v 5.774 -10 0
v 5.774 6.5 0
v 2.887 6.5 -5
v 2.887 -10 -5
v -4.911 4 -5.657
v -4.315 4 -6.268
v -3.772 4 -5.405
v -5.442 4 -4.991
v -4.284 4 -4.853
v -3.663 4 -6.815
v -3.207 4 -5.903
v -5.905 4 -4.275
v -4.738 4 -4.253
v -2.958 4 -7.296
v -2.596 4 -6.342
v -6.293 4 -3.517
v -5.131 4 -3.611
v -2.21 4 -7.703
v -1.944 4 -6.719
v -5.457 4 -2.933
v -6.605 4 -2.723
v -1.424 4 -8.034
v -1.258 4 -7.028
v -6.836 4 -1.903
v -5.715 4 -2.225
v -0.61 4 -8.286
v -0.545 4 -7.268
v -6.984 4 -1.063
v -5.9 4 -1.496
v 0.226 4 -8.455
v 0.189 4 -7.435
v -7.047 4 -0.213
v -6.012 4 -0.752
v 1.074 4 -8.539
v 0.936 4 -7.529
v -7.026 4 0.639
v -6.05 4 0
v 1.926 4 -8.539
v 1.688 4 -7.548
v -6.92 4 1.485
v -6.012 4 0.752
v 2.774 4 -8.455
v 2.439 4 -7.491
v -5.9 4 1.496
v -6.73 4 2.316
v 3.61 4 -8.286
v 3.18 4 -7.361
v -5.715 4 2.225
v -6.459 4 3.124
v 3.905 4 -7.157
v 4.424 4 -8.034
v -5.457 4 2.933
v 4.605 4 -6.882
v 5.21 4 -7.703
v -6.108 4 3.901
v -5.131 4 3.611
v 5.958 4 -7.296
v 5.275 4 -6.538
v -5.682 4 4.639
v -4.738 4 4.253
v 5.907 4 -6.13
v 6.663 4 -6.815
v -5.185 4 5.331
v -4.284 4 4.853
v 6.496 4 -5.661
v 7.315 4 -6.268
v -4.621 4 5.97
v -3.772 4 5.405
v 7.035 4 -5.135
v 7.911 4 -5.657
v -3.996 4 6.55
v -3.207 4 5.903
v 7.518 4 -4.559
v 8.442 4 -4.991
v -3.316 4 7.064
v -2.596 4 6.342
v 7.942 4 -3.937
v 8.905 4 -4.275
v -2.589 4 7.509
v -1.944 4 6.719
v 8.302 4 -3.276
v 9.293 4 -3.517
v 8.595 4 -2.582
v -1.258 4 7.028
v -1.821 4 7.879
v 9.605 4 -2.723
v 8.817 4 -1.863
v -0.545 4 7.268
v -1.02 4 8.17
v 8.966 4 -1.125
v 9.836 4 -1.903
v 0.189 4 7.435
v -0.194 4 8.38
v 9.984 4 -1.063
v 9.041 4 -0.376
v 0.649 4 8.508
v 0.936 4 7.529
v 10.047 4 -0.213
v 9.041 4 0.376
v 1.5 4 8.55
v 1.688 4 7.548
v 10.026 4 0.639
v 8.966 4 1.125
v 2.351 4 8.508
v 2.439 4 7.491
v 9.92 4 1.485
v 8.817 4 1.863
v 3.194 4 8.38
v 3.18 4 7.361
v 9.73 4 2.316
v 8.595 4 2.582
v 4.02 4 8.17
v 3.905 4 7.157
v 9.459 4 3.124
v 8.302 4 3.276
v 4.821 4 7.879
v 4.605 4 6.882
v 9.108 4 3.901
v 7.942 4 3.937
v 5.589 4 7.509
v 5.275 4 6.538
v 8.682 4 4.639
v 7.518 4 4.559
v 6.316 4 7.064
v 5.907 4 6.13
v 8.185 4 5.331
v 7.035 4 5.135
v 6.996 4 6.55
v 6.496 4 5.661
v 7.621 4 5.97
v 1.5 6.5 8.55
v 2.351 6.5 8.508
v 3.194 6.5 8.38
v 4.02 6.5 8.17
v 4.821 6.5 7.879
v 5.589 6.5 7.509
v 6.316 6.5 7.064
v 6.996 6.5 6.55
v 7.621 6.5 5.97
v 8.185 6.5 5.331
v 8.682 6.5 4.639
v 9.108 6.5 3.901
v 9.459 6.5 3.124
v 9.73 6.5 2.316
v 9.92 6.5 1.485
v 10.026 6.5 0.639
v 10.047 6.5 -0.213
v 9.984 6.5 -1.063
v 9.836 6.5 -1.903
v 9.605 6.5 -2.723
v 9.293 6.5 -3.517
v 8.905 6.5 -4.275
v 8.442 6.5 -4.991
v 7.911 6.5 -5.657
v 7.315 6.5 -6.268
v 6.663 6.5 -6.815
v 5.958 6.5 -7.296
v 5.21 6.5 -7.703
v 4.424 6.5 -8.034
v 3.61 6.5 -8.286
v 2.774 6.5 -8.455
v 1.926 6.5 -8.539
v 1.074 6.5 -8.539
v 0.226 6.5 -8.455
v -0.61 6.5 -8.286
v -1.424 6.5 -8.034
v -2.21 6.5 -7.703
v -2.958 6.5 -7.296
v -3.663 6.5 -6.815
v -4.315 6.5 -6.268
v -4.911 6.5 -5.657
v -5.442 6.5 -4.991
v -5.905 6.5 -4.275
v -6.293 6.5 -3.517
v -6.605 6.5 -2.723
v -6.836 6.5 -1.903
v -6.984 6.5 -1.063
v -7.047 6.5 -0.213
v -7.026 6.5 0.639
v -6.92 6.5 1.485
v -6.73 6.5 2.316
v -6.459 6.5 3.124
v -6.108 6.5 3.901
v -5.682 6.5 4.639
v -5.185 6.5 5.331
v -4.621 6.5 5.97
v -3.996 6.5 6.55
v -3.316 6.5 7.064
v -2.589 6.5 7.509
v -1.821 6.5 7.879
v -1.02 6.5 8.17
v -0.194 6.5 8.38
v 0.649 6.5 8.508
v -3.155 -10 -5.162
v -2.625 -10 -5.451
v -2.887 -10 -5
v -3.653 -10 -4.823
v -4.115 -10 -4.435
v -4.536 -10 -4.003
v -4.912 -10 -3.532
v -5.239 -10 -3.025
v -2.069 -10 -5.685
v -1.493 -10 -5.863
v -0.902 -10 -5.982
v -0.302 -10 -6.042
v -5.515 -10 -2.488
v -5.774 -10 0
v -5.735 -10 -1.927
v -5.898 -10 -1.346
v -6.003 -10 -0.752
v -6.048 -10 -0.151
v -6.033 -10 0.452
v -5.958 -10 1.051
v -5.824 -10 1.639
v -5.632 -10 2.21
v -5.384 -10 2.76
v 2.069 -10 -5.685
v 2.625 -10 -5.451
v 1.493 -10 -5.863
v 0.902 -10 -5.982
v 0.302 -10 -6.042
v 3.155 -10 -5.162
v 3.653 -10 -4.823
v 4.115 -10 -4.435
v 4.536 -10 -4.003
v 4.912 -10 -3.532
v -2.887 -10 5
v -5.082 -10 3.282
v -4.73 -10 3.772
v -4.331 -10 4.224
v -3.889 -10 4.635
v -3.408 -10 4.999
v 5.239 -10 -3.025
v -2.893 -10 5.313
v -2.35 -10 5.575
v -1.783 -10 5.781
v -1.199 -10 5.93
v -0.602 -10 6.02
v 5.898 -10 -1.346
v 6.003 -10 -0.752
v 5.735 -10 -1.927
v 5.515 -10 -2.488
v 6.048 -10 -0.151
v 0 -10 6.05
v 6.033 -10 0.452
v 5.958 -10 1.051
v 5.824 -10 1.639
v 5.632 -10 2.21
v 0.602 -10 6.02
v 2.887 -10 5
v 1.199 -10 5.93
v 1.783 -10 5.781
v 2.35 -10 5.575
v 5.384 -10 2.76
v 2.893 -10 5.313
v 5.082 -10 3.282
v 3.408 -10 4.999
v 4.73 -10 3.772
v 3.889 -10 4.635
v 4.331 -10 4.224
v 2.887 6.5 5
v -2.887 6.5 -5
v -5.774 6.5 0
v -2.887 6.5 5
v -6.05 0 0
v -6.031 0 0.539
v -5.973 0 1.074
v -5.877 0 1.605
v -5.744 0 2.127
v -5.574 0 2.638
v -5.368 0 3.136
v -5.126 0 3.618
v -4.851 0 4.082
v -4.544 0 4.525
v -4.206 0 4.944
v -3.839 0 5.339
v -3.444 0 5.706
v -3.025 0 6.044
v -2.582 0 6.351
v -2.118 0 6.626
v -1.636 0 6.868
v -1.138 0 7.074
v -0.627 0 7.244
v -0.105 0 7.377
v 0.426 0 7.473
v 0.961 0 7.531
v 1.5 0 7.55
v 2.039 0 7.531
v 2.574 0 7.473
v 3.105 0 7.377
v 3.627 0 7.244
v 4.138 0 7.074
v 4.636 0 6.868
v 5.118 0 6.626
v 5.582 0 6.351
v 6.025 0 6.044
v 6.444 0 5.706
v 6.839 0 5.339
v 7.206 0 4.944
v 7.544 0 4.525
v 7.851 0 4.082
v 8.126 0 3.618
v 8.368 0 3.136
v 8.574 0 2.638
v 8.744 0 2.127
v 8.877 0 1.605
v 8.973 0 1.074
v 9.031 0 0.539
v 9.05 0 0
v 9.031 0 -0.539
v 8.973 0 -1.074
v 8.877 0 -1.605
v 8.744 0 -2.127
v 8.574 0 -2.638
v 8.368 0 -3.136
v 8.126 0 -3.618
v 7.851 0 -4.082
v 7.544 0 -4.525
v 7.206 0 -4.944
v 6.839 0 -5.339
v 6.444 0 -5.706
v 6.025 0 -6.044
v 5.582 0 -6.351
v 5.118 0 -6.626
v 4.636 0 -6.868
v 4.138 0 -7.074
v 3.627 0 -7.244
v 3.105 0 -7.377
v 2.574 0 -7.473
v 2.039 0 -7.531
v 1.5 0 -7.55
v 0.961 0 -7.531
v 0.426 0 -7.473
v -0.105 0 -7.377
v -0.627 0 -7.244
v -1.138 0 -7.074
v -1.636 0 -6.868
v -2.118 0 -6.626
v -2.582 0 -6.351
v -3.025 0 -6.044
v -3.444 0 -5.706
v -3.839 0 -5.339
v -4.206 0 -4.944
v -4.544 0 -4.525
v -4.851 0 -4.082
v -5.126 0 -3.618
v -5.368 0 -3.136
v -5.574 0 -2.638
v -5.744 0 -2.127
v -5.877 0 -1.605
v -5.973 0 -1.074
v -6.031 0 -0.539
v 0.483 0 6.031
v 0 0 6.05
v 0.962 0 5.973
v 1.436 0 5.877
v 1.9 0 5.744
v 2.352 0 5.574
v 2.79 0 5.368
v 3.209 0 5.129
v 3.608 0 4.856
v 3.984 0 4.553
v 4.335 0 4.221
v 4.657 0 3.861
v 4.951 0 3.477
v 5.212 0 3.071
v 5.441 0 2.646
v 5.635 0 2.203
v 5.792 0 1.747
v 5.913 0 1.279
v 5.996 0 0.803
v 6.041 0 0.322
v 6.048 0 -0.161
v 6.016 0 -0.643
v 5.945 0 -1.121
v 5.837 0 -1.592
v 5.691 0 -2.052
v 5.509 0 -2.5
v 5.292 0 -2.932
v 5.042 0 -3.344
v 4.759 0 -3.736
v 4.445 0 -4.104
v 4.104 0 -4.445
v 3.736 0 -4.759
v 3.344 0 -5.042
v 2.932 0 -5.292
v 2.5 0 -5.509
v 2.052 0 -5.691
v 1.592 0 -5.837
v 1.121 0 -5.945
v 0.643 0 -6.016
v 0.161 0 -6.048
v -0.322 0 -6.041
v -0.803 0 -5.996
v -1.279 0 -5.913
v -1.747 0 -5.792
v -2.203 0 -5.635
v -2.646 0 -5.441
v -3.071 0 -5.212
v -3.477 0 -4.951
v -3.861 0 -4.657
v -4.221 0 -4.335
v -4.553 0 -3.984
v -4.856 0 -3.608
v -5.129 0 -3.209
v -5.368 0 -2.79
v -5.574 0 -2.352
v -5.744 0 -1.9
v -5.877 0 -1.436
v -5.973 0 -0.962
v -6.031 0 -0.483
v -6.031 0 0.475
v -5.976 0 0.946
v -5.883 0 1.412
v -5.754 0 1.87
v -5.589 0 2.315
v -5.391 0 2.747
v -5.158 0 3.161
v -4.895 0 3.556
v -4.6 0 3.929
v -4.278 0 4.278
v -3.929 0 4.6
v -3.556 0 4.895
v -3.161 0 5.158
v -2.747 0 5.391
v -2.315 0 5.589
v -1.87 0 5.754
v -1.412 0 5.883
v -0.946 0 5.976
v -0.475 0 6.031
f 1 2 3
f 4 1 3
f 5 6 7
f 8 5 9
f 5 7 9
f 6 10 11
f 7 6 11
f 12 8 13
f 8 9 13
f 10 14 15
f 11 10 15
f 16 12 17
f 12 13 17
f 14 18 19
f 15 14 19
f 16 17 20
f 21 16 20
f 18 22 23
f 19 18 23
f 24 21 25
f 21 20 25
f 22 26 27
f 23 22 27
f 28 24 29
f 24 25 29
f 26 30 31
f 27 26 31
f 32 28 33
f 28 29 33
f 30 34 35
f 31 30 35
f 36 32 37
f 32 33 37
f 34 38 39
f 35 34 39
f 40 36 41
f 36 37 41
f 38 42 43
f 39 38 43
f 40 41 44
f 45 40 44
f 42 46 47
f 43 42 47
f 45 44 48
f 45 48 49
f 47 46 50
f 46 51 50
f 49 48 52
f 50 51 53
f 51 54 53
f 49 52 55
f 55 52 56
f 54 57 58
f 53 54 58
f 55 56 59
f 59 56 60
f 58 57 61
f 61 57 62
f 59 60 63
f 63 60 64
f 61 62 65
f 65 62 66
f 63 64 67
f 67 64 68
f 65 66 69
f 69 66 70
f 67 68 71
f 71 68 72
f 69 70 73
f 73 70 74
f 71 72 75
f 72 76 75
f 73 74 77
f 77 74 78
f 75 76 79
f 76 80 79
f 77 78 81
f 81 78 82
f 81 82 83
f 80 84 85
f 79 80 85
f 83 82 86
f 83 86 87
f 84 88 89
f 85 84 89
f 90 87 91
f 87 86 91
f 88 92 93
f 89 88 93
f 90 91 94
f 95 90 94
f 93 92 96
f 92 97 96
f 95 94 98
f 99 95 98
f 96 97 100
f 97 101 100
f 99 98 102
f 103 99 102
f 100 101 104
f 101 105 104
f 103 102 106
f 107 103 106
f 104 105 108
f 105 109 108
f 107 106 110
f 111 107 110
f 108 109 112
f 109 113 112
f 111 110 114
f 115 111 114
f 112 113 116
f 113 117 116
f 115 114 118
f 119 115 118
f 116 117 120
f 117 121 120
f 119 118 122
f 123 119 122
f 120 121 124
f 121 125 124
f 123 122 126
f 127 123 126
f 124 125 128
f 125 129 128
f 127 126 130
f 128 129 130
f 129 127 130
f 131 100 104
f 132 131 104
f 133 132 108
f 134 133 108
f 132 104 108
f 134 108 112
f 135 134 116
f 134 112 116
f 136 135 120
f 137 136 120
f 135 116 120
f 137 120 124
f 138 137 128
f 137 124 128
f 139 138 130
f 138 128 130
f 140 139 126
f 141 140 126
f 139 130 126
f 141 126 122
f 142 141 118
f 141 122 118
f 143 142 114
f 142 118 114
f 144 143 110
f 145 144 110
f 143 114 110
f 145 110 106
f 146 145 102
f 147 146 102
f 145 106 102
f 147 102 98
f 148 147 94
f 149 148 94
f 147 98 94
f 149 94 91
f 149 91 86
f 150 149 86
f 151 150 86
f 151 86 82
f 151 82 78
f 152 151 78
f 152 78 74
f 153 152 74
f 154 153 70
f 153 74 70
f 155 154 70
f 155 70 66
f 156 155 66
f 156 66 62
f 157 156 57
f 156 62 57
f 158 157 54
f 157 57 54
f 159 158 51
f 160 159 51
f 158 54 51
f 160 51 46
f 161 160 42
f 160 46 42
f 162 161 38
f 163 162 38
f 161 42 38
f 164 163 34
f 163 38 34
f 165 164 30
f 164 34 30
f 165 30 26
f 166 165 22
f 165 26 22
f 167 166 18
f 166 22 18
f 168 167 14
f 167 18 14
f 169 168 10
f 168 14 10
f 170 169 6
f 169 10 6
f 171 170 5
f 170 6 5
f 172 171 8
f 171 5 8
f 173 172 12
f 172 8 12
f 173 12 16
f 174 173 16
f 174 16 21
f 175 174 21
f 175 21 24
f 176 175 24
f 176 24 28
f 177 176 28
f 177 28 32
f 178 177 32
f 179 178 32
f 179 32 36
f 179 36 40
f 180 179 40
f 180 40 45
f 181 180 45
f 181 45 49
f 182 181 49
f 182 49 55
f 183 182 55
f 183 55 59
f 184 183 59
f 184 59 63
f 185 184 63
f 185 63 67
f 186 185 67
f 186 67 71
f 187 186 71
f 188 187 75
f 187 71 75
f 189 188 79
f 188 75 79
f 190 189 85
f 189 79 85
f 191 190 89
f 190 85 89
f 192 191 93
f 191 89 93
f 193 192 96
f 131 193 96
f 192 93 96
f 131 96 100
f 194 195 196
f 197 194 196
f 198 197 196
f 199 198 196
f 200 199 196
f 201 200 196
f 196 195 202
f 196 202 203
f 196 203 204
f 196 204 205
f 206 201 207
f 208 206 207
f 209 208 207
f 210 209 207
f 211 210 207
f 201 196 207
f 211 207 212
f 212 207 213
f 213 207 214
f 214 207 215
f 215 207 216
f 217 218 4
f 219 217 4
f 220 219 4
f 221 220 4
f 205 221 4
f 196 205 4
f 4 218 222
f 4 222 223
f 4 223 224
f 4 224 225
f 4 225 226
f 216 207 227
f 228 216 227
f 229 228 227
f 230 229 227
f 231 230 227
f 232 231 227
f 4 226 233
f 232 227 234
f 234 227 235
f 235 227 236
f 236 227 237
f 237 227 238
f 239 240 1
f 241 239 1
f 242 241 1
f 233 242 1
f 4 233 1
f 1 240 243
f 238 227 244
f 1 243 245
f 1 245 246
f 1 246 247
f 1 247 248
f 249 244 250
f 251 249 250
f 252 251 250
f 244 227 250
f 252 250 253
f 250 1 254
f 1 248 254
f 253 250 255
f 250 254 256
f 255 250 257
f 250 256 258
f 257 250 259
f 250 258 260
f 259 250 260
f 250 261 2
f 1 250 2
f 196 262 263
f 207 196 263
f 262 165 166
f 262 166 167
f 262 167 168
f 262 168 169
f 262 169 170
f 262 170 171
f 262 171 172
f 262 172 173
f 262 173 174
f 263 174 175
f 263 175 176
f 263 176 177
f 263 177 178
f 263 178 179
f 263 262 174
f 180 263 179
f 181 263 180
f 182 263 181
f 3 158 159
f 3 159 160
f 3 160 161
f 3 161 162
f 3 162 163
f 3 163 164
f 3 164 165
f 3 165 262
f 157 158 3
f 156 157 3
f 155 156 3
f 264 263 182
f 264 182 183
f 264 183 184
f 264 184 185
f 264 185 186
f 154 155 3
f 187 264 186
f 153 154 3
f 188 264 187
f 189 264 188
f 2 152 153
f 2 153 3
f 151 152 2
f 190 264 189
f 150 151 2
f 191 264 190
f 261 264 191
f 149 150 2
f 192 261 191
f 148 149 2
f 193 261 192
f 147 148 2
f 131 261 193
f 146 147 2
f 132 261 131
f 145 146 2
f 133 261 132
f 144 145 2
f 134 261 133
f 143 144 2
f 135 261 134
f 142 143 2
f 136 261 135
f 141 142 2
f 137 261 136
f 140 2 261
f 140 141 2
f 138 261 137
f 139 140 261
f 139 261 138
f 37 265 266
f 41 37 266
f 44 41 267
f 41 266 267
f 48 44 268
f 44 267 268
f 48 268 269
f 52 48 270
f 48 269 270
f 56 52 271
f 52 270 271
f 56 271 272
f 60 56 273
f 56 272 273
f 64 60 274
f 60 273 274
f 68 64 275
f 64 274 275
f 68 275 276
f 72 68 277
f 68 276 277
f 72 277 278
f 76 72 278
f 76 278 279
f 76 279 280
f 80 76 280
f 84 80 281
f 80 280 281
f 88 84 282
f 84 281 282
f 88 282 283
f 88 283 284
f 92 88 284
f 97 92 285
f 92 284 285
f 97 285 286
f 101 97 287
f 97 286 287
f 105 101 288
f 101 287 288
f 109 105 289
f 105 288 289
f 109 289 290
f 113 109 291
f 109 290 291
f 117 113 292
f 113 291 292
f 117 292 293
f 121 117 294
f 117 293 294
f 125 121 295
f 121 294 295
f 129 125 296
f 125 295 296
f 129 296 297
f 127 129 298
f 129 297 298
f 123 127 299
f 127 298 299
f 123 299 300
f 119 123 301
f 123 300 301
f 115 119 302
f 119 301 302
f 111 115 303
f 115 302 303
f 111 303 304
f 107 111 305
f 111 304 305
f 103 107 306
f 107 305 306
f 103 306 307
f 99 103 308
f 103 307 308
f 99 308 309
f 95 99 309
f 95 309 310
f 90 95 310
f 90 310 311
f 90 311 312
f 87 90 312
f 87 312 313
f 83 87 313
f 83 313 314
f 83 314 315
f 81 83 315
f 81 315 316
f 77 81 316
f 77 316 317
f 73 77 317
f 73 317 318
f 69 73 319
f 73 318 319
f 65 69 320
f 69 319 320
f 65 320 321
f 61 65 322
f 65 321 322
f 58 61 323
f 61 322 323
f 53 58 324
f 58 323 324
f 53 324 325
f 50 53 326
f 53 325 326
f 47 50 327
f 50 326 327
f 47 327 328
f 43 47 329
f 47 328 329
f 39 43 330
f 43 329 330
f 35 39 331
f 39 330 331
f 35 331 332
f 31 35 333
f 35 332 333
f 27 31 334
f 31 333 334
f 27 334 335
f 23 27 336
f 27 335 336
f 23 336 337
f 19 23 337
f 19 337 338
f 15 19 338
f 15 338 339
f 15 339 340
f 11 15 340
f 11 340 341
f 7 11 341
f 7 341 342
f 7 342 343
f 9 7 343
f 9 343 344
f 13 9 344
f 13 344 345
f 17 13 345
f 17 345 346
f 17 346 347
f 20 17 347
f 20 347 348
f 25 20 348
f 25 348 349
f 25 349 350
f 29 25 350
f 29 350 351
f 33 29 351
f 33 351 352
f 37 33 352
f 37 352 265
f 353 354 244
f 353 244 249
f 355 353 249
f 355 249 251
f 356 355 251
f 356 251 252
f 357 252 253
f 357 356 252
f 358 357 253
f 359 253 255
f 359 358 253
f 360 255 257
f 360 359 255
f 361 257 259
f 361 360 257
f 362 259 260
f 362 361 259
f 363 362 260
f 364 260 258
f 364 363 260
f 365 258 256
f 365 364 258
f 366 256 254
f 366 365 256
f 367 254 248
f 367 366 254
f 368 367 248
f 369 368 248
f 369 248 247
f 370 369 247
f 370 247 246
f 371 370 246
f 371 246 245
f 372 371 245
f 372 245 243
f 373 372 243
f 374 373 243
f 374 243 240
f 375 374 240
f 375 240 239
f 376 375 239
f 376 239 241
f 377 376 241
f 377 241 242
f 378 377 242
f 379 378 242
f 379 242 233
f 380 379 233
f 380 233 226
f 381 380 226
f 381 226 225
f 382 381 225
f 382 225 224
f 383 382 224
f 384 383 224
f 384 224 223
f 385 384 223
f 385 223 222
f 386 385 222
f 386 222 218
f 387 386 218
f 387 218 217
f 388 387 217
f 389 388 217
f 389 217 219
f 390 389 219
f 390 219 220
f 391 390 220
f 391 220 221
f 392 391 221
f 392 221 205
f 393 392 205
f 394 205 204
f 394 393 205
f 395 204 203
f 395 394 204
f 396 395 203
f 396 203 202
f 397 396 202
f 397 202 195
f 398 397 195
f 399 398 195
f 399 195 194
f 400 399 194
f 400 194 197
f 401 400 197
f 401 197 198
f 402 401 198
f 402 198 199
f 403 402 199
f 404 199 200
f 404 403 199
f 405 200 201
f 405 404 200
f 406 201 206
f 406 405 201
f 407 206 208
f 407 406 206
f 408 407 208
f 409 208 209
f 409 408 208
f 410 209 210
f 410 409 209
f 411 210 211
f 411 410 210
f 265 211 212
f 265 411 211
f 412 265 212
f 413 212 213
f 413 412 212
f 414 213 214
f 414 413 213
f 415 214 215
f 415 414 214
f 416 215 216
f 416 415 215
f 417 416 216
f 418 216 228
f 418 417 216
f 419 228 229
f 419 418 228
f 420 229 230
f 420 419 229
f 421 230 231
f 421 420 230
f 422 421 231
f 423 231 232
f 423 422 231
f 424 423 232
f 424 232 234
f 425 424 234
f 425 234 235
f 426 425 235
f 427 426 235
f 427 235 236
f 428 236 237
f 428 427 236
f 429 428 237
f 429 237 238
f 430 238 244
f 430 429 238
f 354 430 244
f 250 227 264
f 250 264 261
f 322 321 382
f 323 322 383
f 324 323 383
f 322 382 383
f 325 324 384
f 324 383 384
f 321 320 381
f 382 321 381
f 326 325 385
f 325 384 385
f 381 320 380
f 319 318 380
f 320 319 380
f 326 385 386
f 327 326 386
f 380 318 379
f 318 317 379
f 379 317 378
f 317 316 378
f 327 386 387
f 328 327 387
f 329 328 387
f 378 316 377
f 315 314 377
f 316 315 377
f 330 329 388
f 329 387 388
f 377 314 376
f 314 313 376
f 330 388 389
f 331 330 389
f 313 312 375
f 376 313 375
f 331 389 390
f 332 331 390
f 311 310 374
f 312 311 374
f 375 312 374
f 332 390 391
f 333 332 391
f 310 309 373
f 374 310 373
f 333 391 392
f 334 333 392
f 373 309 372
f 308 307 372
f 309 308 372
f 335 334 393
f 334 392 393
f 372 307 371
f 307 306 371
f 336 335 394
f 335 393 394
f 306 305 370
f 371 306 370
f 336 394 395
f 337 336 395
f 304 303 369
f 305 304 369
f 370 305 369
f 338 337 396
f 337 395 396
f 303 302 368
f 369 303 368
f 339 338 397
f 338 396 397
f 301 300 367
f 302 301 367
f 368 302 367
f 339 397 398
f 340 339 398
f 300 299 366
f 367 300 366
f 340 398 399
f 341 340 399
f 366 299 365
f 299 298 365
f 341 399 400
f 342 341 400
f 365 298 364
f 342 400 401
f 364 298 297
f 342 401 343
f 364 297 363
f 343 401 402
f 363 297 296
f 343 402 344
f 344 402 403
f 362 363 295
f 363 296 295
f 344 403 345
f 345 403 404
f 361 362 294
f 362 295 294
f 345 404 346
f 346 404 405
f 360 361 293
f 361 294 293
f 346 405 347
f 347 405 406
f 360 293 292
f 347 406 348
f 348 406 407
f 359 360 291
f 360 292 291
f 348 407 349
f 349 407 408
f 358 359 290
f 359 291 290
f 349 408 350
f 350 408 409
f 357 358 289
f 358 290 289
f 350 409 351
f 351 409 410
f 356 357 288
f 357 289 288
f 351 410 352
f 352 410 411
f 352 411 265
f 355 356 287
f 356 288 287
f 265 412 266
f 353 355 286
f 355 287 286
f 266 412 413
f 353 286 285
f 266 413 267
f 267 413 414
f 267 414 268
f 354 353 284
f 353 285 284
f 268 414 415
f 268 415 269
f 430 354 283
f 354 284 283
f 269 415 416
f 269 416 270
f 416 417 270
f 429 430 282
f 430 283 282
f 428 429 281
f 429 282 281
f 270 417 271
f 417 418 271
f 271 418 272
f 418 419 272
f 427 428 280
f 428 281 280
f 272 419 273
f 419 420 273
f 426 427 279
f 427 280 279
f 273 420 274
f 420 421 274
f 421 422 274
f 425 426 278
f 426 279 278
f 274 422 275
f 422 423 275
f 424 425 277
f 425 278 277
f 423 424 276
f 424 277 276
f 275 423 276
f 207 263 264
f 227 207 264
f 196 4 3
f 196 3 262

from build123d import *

# Parameters (mm, degrees)
SKETCH1_R           = 6.05
BOSS_EXTRUDE1_DEPTH = 10
SKETCH1_3_R         = 7.55
BOSS_EXTRUDE2_DEPTH = 4
BOSS_EXTRUDE3_START = 4
SKETCH1_5_R         = 8.55
SKETCH1_5_R_2       = 7.55
SKETCH1_5_R_3       = 6.05
BOSS_EXTRUDE3_DEPTH = 2.5


with BuildPart() as part:
    # Sketch1 → Boss-Extrude1 (new body)
    with BuildSketch(Plane(origin=(0, 0, 0), x_dir=(1, 0, 0), z_dir=(0, 1, 0))):
        with Locations(Location((0, 0, 0), (0, 0, 270))):
            Circle(SKETCH1_R)
        Polygon((5.773502692, 0), (2.886751346, 5), (-2.886751346, 5), (-5.773502692, 0), (-2.886751346, -5), (2.886751346, -5), align=None, mode=Mode.SUBTRACT)
    extrude(amount=-BOSS_EXTRUDE1_DEPTH)

    # Sketch1<3> → Boss-Extrude2 (add)
    with BuildSketch(Plane(origin=(0, 0, 0), x_dir=(1, 0, 0), z_dir=(0, 1, 0))):
        with Locations(Location((1.5, 0, 0), (0, 0, 180))):
            Circle(SKETCH1_3_R)
        Polygon((2.886751346, 5), (-2.886751346, 5), (-5.773502692, 0), (-2.886751346, -5), (2.886751346, -5), (5.773502692, 0), align=None, mode=Mode.SUBTRACT)
    extrude(amount=BOSS_EXTRUDE2_DEPTH)

    # Sketch1<5> → Boss-Extrude3 (add)
    # profile 1 of 3: a face of its own
    with BuildSketch(Plane(origin=(0, 0, 0), x_dir=(1, 0, 0), z_dir=(0, 1, 0)).offset(BOSS_EXTRUDE3_START)):
        with Locations(Location((1.5, 0, 0), (0, 0, 270))):
            Circle(SKETCH1_5_R)
        with Locations(Location((1.5, 0, 0), (0, 0, 180))):
            Circle(SKETCH1_5_R_2, mode=Mode.SUBTRACT)
    # profile 2 of 3: a face of its own
    with BuildSketch(Plane(origin=(0, 0, 0), x_dir=(1, 0, 0), z_dir=(0, 1, 0)).offset(BOSS_EXTRUDE3_START)):
        with Locations(Location((1.5, 0, 0), (0, 0, 180))):
            Circle(SKETCH1_5_R_2)
        with Locations(Location((0, 0, 0), (0, 0, 270))):
            Circle(SKETCH1_5_R_3, mode=Mode.SUBTRACT)
    # profile 3 of 3: a face of its own
    with BuildSketch(Plane(origin=(0, 0, 0), x_dir=(1, 0, 0), z_dir=(0, 1, 0)).offset(BOSS_EXTRUDE3_START)):
        with Locations(Location((0, 0, 0), (0, 0, 270))):
            Circle(SKETCH1_5_R_3)
        Polygon((5.773502692, 0), (2.886751346, 5), (-2.886751346, 5), (-5.773502692, 0), (-2.886751346, -5), (2.886751346, -5), align=None, mode=Mode.SUBTRACT)
    extrude(amount=BOSS_EXTRUDE3_DEPTH)


solid = part.part
